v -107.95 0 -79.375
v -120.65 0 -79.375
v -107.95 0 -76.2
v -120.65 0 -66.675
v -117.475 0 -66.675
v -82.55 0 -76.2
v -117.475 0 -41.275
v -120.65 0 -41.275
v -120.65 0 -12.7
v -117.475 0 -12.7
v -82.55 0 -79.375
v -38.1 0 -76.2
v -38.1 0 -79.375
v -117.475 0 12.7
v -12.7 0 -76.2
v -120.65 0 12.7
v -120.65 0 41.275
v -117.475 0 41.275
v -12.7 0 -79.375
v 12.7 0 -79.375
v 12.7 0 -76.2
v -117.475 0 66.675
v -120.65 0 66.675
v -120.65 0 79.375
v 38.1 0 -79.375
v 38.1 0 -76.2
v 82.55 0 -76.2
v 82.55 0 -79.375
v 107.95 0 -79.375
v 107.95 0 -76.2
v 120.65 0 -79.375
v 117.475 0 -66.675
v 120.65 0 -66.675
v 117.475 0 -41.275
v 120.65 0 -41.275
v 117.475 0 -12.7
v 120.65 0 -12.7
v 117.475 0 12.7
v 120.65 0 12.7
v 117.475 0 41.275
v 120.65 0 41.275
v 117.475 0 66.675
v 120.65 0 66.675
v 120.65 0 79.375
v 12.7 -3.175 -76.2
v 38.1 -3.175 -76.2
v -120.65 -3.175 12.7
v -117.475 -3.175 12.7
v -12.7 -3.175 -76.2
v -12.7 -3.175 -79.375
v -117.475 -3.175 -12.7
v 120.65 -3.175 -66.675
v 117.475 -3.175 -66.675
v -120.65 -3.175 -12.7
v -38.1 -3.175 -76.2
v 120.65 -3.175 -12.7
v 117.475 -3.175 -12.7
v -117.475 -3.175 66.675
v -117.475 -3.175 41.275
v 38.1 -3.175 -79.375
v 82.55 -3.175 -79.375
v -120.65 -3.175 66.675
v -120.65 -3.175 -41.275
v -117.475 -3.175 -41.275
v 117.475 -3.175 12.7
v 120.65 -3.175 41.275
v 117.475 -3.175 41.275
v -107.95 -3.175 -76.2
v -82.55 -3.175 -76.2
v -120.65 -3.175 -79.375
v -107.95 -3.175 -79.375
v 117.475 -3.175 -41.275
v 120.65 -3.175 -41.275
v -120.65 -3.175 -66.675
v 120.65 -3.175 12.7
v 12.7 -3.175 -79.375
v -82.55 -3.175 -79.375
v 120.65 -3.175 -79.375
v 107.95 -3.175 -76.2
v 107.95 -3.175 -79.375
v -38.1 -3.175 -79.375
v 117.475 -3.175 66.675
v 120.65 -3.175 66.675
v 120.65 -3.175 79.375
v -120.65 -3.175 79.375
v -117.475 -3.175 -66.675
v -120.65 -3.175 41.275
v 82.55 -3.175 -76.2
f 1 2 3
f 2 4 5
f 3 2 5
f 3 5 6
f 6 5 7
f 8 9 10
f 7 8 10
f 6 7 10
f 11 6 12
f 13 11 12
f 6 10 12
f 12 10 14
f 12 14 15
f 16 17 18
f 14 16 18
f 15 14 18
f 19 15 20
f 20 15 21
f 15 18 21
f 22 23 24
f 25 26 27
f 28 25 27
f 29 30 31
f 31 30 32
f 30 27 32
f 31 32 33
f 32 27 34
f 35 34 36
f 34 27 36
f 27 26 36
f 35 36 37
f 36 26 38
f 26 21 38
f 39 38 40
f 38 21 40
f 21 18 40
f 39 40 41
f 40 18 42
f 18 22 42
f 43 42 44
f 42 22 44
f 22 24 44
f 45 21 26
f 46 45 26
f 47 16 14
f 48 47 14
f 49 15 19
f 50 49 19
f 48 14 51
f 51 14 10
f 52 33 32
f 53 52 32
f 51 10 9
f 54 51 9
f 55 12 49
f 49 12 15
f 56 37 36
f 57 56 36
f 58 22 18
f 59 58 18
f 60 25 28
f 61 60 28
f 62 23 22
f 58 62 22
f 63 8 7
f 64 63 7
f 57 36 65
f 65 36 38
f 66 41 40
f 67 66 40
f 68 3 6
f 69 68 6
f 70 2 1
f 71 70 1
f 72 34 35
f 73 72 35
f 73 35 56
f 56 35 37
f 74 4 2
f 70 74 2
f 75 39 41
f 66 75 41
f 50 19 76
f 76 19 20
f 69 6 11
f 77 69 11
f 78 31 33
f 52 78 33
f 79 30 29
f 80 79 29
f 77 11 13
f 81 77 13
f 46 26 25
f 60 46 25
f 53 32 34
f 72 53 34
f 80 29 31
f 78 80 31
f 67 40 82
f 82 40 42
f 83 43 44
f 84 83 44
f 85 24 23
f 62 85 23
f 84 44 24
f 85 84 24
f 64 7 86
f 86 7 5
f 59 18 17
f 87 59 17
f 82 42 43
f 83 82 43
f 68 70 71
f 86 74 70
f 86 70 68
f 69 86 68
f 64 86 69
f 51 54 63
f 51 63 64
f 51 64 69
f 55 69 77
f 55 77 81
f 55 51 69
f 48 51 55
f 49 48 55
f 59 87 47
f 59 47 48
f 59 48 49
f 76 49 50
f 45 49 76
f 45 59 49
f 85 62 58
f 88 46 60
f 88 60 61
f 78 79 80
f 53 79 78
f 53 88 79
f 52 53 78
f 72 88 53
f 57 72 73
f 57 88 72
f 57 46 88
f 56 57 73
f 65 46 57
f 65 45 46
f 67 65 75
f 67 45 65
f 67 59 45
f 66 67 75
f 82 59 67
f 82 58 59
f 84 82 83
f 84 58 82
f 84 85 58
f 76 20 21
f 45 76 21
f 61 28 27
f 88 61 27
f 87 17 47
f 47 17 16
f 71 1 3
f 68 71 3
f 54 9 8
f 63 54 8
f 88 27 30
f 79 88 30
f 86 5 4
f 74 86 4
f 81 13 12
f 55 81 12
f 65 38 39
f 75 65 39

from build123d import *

# Parameters (mm, degrees)
F1_DEPTH = 3.175


with BuildPart() as f1:
    # F0 (on Front) → F1 (new body)
    with BuildSketch(Plane.XZ):
        Polygon((107.95, -79.375), (120.65, -79.375), (120.65, -66.675), (117.475, -66.675), (117.475, -41.275), (120.65, -41.275), (120.65, -12.7), (117.475, -12.7), (117.475, 0), (117.475, 12.7), (120.65, 12.7), (120.65, 41.275), (117.475, 41.275), (117.475, 66.675), (120.65, 66.675), (120.65, 79.375), (-120.65, 79.375), (-120.65, 66.675), (-117.475, 66.675), (-117.475, 41.275), (-120.65, 41.275), (-120.65, 12.7), (-117.475, 12.7), (-117.475, 0), (-117.475, -12.7), (-120.65, -12.7), (-120.65, -41.275), (-117.475, -41.275), (-117.475, -66.675), (-120.65, -66.675), (-120.65, -79.375), (-107.95, -79.375), (-107.95, -76.2), (-82.55, -76.2), (-82.55, -79.375), (-38.1, -79.375), (-38.1, -76.2), (-12.7, -76.2), (-12.7, -79.375), (12.7, -79.375), (12.7, -76.2), (38.1, -76.2), (38.1, -79.375), (82.55, -79.375), (82.55, -76.2), (107.95, -76.2), align=None)
    extrude(amount=F1_DEPTH)


solid = f1.part
